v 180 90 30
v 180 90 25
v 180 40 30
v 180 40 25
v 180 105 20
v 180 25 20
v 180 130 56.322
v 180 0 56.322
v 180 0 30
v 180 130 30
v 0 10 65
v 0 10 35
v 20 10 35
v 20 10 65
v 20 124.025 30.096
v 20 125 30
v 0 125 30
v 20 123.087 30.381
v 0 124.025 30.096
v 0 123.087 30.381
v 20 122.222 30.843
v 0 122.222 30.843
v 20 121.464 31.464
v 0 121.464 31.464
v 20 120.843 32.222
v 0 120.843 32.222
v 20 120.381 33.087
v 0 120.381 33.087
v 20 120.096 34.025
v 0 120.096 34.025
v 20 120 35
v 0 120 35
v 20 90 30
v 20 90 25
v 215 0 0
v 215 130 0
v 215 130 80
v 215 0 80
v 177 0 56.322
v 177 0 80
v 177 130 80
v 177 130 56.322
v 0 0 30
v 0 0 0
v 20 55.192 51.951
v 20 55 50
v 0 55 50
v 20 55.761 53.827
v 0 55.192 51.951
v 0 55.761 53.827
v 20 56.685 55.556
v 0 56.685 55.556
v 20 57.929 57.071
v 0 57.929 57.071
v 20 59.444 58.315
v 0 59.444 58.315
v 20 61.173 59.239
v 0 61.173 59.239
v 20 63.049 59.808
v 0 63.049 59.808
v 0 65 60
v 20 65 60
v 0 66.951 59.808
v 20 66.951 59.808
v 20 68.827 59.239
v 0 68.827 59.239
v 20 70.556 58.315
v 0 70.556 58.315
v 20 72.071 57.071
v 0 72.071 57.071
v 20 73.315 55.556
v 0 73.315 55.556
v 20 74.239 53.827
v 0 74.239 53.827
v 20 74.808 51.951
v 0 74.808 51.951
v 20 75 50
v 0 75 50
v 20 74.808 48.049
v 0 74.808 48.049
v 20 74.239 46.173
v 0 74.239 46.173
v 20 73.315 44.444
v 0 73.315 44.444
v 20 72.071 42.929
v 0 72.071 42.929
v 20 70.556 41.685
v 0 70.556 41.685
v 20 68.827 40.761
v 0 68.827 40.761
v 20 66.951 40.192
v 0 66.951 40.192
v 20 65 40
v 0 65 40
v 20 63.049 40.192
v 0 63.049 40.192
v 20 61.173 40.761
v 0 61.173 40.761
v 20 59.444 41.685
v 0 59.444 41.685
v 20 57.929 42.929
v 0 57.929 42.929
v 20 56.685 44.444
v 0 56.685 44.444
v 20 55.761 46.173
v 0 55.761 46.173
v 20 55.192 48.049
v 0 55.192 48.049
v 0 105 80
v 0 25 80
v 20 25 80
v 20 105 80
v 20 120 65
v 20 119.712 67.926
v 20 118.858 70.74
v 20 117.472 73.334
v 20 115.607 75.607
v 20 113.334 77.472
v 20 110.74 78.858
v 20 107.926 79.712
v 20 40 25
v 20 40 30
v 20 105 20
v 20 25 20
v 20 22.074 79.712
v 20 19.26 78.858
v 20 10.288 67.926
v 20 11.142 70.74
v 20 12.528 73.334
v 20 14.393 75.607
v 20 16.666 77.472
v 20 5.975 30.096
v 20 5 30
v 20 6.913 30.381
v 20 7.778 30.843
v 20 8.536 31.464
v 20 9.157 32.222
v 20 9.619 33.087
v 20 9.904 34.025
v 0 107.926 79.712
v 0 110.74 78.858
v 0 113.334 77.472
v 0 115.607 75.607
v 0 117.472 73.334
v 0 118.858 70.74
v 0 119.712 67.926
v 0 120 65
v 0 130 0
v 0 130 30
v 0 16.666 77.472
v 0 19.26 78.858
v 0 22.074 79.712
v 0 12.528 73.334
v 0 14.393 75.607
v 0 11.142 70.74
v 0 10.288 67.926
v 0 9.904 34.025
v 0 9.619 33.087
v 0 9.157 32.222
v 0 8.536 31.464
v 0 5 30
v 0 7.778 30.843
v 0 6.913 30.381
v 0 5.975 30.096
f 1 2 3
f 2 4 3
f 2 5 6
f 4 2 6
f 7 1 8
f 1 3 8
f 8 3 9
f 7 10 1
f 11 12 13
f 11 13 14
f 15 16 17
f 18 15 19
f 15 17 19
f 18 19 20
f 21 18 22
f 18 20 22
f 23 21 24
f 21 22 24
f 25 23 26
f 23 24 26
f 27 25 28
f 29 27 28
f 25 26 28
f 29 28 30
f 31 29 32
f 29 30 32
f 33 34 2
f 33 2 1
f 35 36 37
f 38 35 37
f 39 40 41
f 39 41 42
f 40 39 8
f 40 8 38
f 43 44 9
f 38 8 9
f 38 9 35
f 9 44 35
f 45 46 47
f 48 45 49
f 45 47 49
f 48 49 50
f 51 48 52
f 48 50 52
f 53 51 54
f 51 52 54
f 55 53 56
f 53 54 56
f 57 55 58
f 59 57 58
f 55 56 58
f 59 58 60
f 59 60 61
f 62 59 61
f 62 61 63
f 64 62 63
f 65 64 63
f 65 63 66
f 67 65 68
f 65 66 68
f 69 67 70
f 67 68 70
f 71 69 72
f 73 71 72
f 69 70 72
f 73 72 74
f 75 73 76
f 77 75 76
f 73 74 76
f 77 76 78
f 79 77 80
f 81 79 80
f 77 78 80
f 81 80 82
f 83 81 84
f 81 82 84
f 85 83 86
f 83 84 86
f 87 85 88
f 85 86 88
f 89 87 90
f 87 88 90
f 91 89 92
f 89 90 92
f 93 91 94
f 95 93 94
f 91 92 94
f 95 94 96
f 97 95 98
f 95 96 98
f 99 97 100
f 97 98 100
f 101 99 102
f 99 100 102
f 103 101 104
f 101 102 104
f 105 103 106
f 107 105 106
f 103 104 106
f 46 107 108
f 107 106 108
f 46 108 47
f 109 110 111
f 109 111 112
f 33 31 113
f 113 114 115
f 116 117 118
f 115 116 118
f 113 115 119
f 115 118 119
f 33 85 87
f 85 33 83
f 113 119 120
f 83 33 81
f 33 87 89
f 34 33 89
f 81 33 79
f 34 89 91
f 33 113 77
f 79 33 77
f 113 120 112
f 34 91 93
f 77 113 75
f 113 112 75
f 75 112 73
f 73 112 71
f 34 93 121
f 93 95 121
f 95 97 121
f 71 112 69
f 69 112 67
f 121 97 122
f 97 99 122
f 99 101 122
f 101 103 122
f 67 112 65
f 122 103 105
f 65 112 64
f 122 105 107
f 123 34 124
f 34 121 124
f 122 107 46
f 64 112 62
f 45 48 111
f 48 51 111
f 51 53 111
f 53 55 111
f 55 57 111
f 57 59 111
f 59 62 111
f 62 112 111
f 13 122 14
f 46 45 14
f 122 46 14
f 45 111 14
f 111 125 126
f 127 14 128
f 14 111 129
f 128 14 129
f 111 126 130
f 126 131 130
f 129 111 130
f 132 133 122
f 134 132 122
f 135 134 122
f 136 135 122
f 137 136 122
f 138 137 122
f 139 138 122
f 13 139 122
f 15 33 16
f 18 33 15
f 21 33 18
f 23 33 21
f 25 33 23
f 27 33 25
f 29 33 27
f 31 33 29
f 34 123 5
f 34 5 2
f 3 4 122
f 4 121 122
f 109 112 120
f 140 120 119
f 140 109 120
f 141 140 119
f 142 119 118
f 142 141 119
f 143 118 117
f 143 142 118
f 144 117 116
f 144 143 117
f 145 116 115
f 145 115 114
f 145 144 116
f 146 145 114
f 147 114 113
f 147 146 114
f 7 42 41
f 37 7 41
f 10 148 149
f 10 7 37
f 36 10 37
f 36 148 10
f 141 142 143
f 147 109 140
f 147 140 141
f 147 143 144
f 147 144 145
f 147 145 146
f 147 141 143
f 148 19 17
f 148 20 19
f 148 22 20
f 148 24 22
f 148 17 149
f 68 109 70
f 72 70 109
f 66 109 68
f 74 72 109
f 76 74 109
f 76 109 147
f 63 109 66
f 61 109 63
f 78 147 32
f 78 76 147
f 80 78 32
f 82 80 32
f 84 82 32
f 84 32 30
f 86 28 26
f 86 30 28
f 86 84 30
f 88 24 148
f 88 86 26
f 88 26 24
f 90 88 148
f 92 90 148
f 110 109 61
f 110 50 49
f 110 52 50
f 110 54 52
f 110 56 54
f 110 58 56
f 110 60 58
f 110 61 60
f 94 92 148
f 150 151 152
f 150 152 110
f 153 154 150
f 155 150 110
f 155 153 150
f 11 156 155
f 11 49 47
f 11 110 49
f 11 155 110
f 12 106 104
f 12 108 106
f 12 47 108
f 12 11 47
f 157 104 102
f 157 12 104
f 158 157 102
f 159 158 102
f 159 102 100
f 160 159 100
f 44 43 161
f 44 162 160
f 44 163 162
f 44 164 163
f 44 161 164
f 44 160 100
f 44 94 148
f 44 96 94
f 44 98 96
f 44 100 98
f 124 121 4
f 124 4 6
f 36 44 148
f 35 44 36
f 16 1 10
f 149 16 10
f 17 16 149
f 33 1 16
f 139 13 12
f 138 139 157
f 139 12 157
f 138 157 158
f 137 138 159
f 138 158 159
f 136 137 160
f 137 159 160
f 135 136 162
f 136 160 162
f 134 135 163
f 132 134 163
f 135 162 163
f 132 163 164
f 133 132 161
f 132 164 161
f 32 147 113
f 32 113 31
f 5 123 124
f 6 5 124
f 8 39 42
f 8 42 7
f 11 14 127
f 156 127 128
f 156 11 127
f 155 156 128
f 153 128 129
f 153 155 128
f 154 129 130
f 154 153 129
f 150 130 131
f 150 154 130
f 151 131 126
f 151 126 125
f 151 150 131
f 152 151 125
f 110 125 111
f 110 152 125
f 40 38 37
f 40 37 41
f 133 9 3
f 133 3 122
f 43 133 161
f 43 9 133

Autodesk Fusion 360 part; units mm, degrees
sketch "Sketch1" plane through (0, 0, 0) normal (0, 1, 0) x (1, 0, 0)
  line L0 (0, 0) -> (215, 0)
  line L1 (215, 0) -> (215, -30)
  line L2 (215, -30) -> (0, -30)
  line L3 (0, -30) -> (0, 0)
  line L4 (215, 0) -> (180, 0)
  line L5 (180, 0) -> (180, -80)
  line L6 (180, -80) -> (215, -80)
  line L7 (215, -80) -> (215, 0)
  line L8 (180, -80) -> (177, -80)
  line L9 (177, -80) -> (177, -56.3222)
  line L10 (177, -56.3222) -> (180, -56.3222)
  line L11 (180, -56.3222) -> (180, -80)
  dimension "d1" = 215
  dimension "d2" = 30
  dimension "d3" = 35
  dimension "d4" = 80
  dimension "d21" = 3
  dimension "d22" = 23.6778
extrude "Extrude1" add sketch "Sketch1" along normal blind 130 contours L0 L2 L3 L5 | L0 L1 L2 L4 L5 L7 | L2 L5 L6 L7 L11
sketch "Sketch2" plane through (0, 0, 0) normal (-1, 0, 0) x (0, -1, 0)
  line L0 (0, 0) -> (0, 30)
  line L1 (0, 30) -> (-130, 30)
  line L2 (-130, 30) -> (-130, 0)
  line L3 (-130, 0) -> (0, 0)
  line L4 (-10, 35) -> (-10, 65)
  line L5 (-25, 80) -> (-105, 80)
  line L6 (-120, 65) -> (-120, 35)
  line L7 (0, 80) -> (-130, 80)
  arc A0 (-105, 80) -> (-120, 65) centre (-105, 65) ccw
  arc A1 (-10, 65) -> (-25, 80) centre (-25, 65) ccw
  line L8 (-130, 30) -> (-125, 30)
  line L9 (-5, 30) -> (0, 30)
  arc A2 (-125, 30) -> (-120, 35) centre (-125, 35) ccw
  arc A3 (-10, 35) -> (-5, 30) centre (-5, 35) ccw
  circle A4 centre (-65, 50) radius 10
  line L10 (-105, 20) -> (-25, 20)
  line L11 (-105, 20) -> (-90, 25)
  line L12 (-40, 25) -> (-25, 20)
  line L13 (-90, 25) -> (-90, 30)
  line L14 (-40, 25) -> (-40, 30)
  point P0 (-10, 80)
  point P1 (-120, 80)
  dimension "d7" = 110
  dimension "d8" = 15
  dimension "d9" = 5
  dimension "d10" = 20
  dimension "d13" = 80
  dimension "d14" = 5
  dimension "d15" = 5
  dimension "d16" = 25
  dimension "d17" = 50
extrude "Extrude2" add sketch "Sketch2" against normal blind 20 contours L1 L4 L5 L6 L7 A0 A1 A2 A3
extrude "Extrude3" cut sketch "Sketch2" against normal up to surface (160 mm away) from surface at -20 contours L1 L10 L11 L12 L13 L14
extrude "Extrude4" add sketch "Sketch1" along normal blind 130 contours L5 L8 L9 L10 L11
